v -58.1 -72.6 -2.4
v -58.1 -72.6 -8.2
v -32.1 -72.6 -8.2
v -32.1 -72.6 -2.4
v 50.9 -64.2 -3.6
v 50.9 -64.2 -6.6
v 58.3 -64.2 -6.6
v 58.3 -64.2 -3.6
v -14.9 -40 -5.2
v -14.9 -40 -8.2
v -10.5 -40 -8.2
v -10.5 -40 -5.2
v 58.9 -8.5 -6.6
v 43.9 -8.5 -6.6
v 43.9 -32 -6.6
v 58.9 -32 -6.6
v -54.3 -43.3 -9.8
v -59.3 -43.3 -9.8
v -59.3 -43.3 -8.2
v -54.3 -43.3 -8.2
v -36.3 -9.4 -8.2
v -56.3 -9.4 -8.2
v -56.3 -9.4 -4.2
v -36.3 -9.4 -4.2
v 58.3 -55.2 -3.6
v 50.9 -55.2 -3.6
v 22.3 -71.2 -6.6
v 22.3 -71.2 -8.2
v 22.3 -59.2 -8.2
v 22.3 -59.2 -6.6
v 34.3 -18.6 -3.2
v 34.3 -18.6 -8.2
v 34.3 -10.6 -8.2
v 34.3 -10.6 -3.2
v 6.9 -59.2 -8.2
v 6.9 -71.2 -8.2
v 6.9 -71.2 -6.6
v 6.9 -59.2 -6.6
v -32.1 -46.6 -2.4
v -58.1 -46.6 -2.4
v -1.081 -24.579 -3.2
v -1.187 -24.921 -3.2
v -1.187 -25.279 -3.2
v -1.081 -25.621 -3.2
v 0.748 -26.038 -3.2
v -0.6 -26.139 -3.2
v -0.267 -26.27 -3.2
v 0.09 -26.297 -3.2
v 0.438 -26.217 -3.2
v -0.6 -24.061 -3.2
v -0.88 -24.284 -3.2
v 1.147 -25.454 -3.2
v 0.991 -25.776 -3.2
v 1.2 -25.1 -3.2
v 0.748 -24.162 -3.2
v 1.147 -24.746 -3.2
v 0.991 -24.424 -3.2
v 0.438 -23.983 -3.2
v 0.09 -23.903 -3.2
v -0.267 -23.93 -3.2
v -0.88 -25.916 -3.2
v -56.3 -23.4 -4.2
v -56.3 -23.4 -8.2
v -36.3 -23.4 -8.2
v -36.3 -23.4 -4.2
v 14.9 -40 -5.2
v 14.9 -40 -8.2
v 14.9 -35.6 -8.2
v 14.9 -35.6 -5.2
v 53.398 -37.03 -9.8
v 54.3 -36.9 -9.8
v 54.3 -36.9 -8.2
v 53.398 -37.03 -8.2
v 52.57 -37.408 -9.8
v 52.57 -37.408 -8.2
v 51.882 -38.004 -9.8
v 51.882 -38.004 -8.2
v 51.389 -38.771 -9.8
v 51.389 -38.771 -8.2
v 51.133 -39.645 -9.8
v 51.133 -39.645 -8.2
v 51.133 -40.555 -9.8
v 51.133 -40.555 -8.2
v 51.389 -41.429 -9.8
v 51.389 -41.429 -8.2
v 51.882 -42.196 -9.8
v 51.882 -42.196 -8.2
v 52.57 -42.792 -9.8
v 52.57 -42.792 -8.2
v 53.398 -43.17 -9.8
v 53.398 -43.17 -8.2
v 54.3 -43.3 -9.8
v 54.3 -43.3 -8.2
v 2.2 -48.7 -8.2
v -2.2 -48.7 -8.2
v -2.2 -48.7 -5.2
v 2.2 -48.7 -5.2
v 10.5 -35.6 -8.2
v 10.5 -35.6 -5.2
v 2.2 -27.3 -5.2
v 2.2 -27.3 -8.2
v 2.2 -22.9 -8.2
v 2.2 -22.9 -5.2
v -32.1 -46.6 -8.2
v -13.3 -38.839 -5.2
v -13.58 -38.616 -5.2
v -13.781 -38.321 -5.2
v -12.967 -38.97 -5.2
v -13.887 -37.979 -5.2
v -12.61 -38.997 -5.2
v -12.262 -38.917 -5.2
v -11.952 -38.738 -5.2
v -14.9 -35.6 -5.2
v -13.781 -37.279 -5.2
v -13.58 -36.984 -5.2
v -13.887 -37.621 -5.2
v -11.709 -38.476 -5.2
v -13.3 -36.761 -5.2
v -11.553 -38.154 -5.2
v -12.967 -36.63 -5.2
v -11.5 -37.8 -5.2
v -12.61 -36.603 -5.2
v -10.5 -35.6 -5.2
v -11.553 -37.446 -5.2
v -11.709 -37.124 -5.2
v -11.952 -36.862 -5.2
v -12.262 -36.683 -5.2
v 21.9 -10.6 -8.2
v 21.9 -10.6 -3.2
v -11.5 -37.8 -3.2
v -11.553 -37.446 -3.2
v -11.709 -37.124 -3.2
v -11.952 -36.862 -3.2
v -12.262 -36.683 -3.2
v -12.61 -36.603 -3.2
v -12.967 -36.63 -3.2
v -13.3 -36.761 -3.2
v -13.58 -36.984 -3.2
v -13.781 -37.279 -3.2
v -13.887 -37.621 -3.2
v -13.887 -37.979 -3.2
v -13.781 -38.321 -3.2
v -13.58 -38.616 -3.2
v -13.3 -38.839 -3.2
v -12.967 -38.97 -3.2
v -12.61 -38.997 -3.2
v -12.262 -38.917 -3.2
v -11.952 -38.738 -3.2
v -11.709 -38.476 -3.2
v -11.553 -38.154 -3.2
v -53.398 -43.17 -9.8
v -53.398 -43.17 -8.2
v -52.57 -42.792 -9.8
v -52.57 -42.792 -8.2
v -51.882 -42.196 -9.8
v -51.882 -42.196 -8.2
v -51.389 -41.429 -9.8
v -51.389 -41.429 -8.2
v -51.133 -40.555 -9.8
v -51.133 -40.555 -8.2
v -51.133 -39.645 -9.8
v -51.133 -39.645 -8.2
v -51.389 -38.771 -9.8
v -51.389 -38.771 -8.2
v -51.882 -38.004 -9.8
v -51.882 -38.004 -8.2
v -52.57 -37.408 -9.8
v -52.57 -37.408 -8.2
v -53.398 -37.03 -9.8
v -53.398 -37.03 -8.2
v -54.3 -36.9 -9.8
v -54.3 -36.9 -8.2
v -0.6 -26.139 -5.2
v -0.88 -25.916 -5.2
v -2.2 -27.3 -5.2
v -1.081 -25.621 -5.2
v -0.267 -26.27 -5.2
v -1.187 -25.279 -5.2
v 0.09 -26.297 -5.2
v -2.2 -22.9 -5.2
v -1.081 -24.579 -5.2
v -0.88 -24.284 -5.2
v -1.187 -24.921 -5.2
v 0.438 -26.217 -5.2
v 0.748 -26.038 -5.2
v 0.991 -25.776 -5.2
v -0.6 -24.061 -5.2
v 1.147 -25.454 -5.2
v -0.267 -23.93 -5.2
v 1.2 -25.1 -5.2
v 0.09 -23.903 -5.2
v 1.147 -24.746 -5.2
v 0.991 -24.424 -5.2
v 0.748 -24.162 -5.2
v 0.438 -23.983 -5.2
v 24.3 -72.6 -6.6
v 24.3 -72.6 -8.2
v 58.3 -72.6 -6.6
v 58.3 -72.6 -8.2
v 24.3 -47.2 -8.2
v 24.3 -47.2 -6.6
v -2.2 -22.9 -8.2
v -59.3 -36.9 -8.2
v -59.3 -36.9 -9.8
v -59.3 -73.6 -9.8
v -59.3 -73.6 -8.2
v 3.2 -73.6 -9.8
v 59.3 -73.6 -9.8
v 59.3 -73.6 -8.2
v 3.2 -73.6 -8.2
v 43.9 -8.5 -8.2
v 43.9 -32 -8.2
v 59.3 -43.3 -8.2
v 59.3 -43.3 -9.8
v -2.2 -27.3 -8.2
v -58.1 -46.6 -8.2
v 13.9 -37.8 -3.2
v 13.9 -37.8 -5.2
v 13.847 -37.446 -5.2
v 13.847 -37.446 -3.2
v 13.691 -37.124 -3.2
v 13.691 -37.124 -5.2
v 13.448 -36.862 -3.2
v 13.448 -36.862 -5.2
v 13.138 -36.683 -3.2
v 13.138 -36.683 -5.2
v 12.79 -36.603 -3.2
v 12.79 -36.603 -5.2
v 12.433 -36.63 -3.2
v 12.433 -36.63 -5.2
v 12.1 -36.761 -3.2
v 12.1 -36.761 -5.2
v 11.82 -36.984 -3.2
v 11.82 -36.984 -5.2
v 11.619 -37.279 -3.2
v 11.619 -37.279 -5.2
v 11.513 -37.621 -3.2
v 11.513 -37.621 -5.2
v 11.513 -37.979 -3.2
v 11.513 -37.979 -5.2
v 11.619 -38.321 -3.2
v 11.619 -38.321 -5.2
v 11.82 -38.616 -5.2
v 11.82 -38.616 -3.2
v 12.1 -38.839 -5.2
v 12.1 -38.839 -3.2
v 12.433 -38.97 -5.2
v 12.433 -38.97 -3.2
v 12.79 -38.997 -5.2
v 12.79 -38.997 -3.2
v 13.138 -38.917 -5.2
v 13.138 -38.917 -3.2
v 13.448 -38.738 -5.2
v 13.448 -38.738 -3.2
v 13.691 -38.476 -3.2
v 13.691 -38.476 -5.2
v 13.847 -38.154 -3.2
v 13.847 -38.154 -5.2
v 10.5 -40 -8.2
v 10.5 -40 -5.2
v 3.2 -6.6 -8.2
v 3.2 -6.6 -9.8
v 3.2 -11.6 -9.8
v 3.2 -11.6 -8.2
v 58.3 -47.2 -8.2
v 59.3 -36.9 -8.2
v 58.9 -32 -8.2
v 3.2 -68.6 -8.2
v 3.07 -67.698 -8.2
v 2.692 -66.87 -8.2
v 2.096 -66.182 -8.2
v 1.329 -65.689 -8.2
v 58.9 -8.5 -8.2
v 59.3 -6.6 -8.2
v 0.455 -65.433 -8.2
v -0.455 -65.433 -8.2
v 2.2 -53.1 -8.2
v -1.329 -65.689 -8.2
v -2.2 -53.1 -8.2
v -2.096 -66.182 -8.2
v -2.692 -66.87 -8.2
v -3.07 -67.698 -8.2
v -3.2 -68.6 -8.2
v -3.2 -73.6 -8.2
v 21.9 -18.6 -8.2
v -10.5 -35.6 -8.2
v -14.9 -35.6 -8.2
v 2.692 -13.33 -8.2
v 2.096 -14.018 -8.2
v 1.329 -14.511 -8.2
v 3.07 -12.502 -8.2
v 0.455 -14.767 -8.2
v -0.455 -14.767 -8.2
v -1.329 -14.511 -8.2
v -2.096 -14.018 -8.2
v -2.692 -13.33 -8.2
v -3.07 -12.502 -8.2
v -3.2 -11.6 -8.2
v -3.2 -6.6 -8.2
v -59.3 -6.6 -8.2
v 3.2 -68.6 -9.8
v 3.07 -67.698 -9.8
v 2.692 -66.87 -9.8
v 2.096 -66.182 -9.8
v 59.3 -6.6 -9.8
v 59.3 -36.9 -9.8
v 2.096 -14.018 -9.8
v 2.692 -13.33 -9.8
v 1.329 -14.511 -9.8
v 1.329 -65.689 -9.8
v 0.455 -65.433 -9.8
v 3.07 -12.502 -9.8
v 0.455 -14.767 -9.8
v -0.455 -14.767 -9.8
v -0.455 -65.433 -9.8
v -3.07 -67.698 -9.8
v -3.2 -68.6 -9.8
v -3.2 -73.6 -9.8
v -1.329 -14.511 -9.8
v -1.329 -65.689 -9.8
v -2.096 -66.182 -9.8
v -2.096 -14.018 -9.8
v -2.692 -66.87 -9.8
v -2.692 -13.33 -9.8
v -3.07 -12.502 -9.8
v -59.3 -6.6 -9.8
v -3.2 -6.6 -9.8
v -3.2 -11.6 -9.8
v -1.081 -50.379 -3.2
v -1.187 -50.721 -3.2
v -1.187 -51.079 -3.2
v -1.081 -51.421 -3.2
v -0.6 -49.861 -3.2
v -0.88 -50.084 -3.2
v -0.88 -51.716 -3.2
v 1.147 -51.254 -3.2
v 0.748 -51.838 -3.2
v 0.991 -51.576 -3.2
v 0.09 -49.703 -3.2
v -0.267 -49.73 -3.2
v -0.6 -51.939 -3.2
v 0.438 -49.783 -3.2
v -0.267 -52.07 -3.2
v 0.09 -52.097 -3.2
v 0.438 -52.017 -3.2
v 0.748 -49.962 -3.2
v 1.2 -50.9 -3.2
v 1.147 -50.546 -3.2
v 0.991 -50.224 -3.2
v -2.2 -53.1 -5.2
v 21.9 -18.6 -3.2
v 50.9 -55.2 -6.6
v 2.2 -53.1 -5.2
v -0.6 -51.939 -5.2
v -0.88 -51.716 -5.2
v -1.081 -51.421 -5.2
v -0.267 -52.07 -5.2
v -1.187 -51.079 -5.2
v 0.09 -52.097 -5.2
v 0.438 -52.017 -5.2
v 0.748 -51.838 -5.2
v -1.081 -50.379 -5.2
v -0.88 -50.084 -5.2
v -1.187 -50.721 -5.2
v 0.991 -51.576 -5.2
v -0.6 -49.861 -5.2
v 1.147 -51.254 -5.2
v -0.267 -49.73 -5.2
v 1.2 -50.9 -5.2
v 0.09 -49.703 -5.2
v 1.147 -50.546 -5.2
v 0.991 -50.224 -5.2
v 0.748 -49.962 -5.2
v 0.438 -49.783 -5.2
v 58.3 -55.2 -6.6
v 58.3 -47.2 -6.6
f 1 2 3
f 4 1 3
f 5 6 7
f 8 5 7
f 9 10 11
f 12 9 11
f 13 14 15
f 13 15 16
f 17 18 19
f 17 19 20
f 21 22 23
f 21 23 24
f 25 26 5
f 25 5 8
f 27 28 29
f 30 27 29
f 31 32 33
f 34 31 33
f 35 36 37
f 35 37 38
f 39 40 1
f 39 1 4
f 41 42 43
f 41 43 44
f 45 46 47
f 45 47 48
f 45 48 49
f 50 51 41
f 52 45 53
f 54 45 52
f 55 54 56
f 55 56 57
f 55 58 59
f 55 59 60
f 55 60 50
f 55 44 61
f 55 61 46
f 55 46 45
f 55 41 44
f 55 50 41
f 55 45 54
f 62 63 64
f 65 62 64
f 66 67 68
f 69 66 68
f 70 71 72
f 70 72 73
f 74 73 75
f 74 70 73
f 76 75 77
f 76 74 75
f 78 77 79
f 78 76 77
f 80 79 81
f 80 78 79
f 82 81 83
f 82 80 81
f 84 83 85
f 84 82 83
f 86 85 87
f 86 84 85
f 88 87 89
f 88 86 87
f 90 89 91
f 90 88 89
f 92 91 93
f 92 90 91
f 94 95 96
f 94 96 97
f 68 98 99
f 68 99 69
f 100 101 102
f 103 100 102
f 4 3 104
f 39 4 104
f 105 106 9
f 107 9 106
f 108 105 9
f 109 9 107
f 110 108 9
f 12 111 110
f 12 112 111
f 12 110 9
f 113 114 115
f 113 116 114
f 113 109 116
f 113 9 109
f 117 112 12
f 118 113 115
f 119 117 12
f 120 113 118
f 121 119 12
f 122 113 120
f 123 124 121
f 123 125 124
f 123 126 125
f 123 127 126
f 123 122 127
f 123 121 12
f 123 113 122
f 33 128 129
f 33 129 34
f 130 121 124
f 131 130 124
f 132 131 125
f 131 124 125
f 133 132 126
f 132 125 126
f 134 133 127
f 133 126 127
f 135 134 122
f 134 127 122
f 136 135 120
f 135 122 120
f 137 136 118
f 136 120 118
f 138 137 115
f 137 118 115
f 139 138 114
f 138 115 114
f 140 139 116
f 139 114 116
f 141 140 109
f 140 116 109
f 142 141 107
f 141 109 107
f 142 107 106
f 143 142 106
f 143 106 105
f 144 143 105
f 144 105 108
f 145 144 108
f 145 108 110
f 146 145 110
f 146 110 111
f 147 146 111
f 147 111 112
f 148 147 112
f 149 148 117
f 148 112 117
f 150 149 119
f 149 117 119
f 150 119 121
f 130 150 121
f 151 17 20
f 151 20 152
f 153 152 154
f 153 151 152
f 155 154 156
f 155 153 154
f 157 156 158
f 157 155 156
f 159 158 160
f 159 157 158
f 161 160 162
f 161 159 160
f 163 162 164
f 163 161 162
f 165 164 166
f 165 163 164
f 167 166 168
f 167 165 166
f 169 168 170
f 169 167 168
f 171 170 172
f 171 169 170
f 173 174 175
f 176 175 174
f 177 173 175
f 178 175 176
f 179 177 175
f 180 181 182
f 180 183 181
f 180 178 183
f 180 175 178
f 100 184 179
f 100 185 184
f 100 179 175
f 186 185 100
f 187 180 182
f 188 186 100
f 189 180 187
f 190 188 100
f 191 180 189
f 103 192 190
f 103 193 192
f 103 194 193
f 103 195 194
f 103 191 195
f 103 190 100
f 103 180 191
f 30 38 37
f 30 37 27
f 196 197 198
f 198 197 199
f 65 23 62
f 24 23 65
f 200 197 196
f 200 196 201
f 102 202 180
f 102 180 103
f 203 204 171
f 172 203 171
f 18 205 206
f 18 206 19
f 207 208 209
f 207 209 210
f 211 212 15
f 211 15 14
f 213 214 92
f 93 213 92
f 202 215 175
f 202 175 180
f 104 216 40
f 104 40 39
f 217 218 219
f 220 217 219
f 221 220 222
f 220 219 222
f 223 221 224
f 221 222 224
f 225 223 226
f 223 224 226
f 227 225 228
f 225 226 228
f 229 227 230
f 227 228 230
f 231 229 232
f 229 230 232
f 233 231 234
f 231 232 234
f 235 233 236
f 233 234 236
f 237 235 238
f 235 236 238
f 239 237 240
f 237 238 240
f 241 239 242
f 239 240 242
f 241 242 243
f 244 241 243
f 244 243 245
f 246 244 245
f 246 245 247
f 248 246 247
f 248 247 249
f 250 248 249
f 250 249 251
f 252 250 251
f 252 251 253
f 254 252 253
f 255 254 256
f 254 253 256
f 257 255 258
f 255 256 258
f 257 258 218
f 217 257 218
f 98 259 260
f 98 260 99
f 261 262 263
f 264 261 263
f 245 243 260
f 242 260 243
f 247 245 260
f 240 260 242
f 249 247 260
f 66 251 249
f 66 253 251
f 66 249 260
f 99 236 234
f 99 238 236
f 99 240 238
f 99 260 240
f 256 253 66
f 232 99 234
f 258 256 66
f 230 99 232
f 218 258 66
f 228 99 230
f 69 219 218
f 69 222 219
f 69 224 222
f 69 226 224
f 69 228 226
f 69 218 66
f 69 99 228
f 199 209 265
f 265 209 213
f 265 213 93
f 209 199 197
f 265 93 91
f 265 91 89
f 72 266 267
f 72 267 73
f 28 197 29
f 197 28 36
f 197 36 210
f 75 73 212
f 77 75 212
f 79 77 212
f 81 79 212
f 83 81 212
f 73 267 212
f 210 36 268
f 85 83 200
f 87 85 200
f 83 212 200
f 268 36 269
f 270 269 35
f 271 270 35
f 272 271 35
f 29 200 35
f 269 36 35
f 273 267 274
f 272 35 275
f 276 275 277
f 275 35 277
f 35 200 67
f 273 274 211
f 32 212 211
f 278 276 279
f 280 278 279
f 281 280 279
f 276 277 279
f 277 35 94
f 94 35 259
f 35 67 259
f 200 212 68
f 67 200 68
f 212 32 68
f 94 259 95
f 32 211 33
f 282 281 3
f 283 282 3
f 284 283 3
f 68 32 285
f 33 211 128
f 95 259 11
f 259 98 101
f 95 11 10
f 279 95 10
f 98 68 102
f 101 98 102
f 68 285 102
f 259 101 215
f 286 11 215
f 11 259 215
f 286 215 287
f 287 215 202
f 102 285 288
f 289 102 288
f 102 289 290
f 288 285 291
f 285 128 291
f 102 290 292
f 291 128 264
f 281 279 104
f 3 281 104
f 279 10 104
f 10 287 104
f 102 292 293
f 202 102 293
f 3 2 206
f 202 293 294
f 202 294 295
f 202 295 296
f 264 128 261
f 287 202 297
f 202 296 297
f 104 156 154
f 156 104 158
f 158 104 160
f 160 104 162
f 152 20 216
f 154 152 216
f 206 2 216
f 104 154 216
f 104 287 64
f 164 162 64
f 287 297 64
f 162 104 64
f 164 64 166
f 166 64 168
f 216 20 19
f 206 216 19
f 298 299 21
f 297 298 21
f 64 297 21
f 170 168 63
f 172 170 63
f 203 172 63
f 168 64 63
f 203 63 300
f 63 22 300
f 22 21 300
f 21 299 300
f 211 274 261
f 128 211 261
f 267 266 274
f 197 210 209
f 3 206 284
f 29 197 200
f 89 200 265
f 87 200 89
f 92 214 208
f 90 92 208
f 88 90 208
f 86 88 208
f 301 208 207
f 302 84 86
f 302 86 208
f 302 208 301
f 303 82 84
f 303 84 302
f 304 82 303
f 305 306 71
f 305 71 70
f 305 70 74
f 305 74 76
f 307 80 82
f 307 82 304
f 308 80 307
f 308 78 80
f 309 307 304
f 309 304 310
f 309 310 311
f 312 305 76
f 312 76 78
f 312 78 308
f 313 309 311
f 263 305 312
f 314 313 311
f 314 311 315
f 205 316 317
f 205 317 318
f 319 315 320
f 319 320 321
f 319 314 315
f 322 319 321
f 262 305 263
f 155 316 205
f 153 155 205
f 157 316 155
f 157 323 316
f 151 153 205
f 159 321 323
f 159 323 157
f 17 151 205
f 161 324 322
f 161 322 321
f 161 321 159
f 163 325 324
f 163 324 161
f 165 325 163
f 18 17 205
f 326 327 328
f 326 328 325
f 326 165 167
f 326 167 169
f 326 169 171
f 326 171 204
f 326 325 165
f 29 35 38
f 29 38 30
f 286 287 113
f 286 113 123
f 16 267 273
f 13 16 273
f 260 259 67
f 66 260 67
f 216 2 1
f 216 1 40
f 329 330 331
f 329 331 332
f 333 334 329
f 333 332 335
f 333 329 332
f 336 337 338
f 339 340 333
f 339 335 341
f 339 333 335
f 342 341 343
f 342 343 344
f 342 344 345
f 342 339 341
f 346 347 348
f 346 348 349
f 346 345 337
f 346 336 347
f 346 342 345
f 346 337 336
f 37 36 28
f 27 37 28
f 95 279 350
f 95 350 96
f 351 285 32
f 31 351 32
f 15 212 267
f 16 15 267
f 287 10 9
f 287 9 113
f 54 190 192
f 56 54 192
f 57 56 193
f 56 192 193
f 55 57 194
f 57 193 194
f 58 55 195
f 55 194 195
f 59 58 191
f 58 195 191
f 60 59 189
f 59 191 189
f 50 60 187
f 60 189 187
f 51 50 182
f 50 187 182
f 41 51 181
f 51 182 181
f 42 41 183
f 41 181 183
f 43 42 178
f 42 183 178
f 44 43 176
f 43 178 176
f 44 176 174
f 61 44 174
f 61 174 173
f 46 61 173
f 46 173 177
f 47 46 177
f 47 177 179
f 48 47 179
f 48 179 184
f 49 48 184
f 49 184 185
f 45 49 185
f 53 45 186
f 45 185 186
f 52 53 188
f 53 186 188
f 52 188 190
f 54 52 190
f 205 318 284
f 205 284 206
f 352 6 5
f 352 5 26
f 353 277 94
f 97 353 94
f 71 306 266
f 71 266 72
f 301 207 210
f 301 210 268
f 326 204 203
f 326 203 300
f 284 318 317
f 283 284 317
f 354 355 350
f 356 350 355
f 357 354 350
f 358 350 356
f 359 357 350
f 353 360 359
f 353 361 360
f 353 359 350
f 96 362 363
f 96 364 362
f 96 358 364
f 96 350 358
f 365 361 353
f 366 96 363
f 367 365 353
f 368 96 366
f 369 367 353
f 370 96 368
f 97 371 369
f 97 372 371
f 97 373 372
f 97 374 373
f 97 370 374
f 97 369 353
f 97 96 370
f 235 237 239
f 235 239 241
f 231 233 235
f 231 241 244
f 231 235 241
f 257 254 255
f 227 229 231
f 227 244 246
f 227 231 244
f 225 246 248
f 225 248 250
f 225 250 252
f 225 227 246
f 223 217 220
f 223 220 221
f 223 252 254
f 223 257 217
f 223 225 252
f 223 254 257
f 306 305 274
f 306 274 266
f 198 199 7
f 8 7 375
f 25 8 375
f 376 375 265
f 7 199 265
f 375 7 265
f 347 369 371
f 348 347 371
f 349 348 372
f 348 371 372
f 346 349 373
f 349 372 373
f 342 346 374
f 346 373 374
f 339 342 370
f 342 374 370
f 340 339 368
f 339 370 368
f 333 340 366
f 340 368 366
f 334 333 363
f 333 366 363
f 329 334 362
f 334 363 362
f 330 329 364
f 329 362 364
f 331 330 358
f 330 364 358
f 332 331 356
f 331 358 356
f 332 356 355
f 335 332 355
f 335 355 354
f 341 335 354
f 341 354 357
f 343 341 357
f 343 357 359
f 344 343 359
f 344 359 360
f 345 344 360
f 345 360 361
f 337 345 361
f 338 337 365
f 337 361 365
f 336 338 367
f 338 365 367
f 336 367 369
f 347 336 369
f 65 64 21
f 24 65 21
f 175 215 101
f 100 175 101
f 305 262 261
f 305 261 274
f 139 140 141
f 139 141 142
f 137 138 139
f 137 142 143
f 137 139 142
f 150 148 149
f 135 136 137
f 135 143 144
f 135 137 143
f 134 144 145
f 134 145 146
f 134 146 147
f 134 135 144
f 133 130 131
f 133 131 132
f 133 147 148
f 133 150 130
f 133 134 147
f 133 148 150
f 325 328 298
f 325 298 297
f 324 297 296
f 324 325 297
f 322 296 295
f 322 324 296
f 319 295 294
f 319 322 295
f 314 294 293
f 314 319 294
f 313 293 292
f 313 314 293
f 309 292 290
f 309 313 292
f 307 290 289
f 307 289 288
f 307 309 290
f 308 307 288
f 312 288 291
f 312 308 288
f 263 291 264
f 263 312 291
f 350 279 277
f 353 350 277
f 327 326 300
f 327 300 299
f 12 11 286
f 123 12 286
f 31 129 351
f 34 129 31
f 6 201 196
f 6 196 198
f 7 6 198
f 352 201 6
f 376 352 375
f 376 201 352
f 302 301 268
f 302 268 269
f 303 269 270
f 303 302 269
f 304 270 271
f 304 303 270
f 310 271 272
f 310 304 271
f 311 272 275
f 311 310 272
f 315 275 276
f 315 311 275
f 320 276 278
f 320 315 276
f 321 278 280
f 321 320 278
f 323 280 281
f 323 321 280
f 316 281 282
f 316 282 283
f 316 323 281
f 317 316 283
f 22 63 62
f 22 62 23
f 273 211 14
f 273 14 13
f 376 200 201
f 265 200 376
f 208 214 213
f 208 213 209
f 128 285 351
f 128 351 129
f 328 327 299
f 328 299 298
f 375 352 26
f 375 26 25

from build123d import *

# Parameters (mm, degrees)
PAD010_DEPTH  = 1.6
SKETCH055_W   = 15.4
SKETCH055_H   = 12
SKETCH055_W_2 = 15
SKETCH055_H_2 = 23.5
SKETCH055_W_3 = 34
SKETCH055_H_3 = 25.4
PAD011_DEPTH  = 1.6
SKETCH056_W   = 26
SKETCH056_H   = 26
PAD012_DEPTH  = 5.8
SKETCH057_W   = 20
SKETCH057_H   = 14
PAD013_DEPTH  = 4
SKETCH058_W   = 12.4
SKETCH058_H   = 8
PAD014_DEPTH  = 5
SKETCH059_W   = 7.4
SKETCH059_H   = 9
PAD015_DEPTH  = 3
SKETCH060_W   = 4.4
SKETCH060_H   = 4.4
PAD016_DEPTH  = 3
SKETCH061_R   = 1.2
PAD017_DEPTH  = 2


with BuildPart() as part:
    # Sketch053 → Pad010 (new body)
    with BuildSketch(Plane.XY):
        with BuildLine():
            Line((-59.3, -6.6), (-3.2, -6.6))
            Line((-3.2, -6.6), (-3.2, -11.6))
            ThreePointArc((-3.2, -11.6), (0, -14.8), (3.2, -11.6))
            Line((3.2, -6.6), (3.2, -11.6))
            Line((3.2, -6.6), (59.3, -6.6))
            Line((59.3, -6.6), (59.3, -36.9))
            Line((59.3, -36.9), (54.3, -36.9))
            ThreePointArc((54.3, -36.9), (51.1, -40.1), (54.3, -43.3))
            Line((59.3, -43.3), (54.3, -43.3))
            Line((59.3, -43.3), (59.3, -73.6))
            Line((59.3, -73.6), (3.2, -73.6))
            Line((3.2, -73.6), (3.2, -68.6))
            ThreePointArc((3.2, -68.6), (0, -65.4), (-3.2, -68.6))
            Line((-3.2, -73.6), (-3.2, -68.6))
            Line((-3.2, -73.6), (-59.3, -73.6))
            Line((-59.3, -73.6), (-59.3, -43.3))
            Line((-59.3, -43.3), (-54.3, -43.3))
            ThreePointArc((-54.3, -43.3), (-51.1, -40.1), (-54.3, -36.9))
            Line((-59.3, -36.9), (-54.3, -36.9))
            Line((-59.3, -36.9), (-59.3, -6.6))
        make_face()
    extrude(amount=PAD010_DEPTH)

    # Sketch055 (on Face22 of Pad010) → Pad011 (join)
    with BuildSketch(Plane.XY.offset(1.6)):
        with Locations((14.6, -65.2)):
            Rectangle(SKETCH055_W, SKETCH055_H)
        with Locations((51.4, -20.25)):
            Rectangle(SKETCH055_W_2, SKETCH055_H_2)
        with Locations((41.3, -59.9)):
            Rectangle(SKETCH055_W_3, SKETCH055_H_3)
    extrude(amount=PAD011_DEPTH)

    # Sketch056 (on Face5 of Pad011) → Pad012 (join)
    with BuildSketch(Plane.XY.offset(1.6)):
        with Locations((-45.1, -59.6)):
            Rectangle(SKETCH056_W, SKETCH056_H)
    extrude(amount=PAD012_DEPTH)

    # Sketch057 (on Face5 of Pad012) → Pad013 (join)
    with BuildSketch(Plane.XY.offset(1.6)):
        with Locations((-46.3, -16.4)):
            Rectangle(SKETCH057_W, SKETCH057_H)
    extrude(amount=PAD013_DEPTH)

    # Sketch058 (on Face5 of Pad013) → Pad014 (join)
    with BuildSketch(Plane.XY.offset(1.6)):
        with Locations((28.1, -14.6)):
            Rectangle(SKETCH058_W, SKETCH058_H)
    extrude(amount=PAD014_DEPTH)

    # Sketch059 (on Face47 of Pad014) → Pad015 (join)
    with BuildSketch(Plane.XY.offset(3.2)):
        with Locations((54.6, -59.7)):
            Rectangle(SKETCH059_W, SKETCH059_H)
    extrude(amount=PAD015_DEPTH)

    # Sketch060 (on Face5 of Pad015) → Pad016 (join)
    with BuildSketch(Plane.XY.offset(1.6)):
        with Locations((-12.7, -37.8)):
            Rectangle(SKETCH060_W, SKETCH060_H)
        with Locations((0, -25.1)):
            Rectangle(SKETCH060_W, SKETCH060_H)
        with Locations((12.7, -37.8)):
            Rectangle(SKETCH060_W, SKETCH060_H)
        with Locations((0, -50.9)):
            Rectangle(SKETCH060_W, SKETCH060_H)
    extrude(amount=PAD016_DEPTH)

    # Sketch061 (on Face71 of Pad016) → Pad017 (join)
    with BuildSketch(Plane.XY.offset(4.6)):
        with Locations((-12.7, -37.8)):
            Circle(SKETCH061_R)
        with Locations((0, -25.1)):
            Circle(SKETCH061_R)
        with Locations((12.7, -37.8)):
            Circle(SKETCH061_R)
        with Locations((0, -50.9)):
            Circle(SKETCH061_R)
    extrude(amount=PAD017_DEPTH)


with BuildPart() as part_1:
    # Body008 placement: moved
    add(part.part.moved(Location((0, 0, -9.8))))


solid = part_1.part
